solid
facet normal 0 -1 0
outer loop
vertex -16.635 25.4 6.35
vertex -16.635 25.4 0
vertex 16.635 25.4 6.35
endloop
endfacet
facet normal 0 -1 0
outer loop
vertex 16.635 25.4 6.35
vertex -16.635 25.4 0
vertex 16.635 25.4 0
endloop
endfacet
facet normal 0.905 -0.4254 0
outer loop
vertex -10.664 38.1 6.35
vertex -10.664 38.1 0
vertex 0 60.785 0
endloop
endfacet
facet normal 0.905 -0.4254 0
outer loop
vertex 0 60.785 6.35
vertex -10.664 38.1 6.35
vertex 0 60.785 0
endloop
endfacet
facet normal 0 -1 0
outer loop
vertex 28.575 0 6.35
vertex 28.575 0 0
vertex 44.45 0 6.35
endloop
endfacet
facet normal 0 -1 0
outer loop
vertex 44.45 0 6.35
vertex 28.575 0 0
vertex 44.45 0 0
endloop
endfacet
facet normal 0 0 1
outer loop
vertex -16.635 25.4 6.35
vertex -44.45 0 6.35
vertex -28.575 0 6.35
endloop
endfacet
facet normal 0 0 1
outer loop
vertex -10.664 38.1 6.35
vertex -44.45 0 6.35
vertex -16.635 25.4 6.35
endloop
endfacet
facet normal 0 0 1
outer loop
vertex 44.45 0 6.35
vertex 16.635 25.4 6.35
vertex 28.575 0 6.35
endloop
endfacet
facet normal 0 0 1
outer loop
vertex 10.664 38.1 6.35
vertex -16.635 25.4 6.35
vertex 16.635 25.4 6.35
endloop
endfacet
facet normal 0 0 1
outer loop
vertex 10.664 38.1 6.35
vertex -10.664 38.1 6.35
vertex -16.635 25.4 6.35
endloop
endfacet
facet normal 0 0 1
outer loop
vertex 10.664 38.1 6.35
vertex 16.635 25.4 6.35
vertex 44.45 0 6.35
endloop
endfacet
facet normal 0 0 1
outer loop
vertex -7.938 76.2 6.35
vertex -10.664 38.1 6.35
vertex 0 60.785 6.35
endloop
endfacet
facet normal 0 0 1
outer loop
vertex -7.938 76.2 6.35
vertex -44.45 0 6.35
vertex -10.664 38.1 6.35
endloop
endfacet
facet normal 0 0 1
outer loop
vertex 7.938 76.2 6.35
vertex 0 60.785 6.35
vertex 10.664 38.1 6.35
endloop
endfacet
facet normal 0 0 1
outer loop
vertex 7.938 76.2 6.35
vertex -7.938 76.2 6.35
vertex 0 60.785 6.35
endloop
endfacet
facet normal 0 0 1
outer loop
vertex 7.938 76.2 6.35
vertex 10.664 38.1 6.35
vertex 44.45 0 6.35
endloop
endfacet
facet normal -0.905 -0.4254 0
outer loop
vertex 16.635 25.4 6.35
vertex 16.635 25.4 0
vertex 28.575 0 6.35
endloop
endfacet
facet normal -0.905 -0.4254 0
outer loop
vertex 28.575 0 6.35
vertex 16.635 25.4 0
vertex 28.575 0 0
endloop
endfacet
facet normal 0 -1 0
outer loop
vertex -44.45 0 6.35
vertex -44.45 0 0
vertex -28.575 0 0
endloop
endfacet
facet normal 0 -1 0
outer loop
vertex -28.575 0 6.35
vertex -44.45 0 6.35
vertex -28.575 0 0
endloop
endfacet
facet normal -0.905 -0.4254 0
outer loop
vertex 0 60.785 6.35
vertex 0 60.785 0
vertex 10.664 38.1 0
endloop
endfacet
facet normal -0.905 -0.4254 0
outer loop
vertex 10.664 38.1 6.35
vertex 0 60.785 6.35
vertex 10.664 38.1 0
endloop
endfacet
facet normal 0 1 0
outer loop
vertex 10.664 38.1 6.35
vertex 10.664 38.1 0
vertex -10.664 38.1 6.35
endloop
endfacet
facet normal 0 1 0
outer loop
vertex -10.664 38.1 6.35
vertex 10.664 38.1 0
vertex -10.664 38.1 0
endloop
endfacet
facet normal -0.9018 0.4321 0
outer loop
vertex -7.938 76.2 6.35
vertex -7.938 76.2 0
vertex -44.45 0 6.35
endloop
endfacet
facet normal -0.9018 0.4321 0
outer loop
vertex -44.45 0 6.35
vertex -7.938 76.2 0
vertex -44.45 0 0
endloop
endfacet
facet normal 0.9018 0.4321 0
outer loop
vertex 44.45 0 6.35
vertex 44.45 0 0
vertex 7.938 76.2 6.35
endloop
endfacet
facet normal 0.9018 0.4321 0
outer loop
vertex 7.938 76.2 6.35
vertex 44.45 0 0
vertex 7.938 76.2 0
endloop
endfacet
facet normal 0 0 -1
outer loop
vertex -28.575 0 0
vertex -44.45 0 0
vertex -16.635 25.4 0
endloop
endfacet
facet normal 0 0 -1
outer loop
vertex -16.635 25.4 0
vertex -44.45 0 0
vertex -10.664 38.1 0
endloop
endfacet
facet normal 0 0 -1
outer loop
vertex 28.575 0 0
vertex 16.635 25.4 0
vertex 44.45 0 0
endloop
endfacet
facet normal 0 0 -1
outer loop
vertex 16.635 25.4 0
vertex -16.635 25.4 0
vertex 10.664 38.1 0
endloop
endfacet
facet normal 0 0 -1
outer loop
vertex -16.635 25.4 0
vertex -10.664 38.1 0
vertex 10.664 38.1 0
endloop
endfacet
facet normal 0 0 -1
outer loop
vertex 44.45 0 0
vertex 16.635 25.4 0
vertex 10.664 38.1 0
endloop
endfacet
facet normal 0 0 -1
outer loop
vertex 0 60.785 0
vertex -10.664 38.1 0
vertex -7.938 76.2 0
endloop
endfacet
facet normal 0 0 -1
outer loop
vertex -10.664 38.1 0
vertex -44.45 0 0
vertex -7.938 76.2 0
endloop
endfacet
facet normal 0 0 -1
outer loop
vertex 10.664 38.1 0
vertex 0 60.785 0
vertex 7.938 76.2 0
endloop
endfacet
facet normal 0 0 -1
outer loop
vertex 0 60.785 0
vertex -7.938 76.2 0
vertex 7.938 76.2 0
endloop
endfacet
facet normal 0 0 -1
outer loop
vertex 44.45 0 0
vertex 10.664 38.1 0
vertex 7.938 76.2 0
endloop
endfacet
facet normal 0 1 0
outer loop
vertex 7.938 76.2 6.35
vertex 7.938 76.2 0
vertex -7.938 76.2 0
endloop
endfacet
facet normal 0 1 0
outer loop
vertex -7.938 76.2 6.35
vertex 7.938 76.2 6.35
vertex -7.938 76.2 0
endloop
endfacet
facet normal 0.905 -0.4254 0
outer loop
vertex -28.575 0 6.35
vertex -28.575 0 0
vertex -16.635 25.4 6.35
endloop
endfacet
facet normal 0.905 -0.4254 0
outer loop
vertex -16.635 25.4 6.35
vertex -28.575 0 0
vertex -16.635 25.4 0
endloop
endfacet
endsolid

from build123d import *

# Parameters (mm, degrees)
BOSS_EXTRUDE3_DEPTH = 6.35


with BuildPart() as part:
    # Sketch1 → Boss-Extrude3 (new body)
    with BuildSketch(Plane.XY):
        Polygon((0, 60.785489465), (0, 76.2), (-7.9375, 76.2), (-44.45, 0), (-28.575, 0), (-16.634568058, 25.4), (0, 25.4), (0, 38.1), (-10.664352087, 38.1), align=None)
        Polygon((7.9375, 76.2), (0, 76.2), (0, 60.785489465), (10.664352087, 38.1), (0, 38.1), (0, 25.4), (16.634568058, 25.4), (28.575, 0), (44.45, 0), align=None)
    extrude(amount=BOSS_EXTRUDE3_DEPTH)


solid = part.part
